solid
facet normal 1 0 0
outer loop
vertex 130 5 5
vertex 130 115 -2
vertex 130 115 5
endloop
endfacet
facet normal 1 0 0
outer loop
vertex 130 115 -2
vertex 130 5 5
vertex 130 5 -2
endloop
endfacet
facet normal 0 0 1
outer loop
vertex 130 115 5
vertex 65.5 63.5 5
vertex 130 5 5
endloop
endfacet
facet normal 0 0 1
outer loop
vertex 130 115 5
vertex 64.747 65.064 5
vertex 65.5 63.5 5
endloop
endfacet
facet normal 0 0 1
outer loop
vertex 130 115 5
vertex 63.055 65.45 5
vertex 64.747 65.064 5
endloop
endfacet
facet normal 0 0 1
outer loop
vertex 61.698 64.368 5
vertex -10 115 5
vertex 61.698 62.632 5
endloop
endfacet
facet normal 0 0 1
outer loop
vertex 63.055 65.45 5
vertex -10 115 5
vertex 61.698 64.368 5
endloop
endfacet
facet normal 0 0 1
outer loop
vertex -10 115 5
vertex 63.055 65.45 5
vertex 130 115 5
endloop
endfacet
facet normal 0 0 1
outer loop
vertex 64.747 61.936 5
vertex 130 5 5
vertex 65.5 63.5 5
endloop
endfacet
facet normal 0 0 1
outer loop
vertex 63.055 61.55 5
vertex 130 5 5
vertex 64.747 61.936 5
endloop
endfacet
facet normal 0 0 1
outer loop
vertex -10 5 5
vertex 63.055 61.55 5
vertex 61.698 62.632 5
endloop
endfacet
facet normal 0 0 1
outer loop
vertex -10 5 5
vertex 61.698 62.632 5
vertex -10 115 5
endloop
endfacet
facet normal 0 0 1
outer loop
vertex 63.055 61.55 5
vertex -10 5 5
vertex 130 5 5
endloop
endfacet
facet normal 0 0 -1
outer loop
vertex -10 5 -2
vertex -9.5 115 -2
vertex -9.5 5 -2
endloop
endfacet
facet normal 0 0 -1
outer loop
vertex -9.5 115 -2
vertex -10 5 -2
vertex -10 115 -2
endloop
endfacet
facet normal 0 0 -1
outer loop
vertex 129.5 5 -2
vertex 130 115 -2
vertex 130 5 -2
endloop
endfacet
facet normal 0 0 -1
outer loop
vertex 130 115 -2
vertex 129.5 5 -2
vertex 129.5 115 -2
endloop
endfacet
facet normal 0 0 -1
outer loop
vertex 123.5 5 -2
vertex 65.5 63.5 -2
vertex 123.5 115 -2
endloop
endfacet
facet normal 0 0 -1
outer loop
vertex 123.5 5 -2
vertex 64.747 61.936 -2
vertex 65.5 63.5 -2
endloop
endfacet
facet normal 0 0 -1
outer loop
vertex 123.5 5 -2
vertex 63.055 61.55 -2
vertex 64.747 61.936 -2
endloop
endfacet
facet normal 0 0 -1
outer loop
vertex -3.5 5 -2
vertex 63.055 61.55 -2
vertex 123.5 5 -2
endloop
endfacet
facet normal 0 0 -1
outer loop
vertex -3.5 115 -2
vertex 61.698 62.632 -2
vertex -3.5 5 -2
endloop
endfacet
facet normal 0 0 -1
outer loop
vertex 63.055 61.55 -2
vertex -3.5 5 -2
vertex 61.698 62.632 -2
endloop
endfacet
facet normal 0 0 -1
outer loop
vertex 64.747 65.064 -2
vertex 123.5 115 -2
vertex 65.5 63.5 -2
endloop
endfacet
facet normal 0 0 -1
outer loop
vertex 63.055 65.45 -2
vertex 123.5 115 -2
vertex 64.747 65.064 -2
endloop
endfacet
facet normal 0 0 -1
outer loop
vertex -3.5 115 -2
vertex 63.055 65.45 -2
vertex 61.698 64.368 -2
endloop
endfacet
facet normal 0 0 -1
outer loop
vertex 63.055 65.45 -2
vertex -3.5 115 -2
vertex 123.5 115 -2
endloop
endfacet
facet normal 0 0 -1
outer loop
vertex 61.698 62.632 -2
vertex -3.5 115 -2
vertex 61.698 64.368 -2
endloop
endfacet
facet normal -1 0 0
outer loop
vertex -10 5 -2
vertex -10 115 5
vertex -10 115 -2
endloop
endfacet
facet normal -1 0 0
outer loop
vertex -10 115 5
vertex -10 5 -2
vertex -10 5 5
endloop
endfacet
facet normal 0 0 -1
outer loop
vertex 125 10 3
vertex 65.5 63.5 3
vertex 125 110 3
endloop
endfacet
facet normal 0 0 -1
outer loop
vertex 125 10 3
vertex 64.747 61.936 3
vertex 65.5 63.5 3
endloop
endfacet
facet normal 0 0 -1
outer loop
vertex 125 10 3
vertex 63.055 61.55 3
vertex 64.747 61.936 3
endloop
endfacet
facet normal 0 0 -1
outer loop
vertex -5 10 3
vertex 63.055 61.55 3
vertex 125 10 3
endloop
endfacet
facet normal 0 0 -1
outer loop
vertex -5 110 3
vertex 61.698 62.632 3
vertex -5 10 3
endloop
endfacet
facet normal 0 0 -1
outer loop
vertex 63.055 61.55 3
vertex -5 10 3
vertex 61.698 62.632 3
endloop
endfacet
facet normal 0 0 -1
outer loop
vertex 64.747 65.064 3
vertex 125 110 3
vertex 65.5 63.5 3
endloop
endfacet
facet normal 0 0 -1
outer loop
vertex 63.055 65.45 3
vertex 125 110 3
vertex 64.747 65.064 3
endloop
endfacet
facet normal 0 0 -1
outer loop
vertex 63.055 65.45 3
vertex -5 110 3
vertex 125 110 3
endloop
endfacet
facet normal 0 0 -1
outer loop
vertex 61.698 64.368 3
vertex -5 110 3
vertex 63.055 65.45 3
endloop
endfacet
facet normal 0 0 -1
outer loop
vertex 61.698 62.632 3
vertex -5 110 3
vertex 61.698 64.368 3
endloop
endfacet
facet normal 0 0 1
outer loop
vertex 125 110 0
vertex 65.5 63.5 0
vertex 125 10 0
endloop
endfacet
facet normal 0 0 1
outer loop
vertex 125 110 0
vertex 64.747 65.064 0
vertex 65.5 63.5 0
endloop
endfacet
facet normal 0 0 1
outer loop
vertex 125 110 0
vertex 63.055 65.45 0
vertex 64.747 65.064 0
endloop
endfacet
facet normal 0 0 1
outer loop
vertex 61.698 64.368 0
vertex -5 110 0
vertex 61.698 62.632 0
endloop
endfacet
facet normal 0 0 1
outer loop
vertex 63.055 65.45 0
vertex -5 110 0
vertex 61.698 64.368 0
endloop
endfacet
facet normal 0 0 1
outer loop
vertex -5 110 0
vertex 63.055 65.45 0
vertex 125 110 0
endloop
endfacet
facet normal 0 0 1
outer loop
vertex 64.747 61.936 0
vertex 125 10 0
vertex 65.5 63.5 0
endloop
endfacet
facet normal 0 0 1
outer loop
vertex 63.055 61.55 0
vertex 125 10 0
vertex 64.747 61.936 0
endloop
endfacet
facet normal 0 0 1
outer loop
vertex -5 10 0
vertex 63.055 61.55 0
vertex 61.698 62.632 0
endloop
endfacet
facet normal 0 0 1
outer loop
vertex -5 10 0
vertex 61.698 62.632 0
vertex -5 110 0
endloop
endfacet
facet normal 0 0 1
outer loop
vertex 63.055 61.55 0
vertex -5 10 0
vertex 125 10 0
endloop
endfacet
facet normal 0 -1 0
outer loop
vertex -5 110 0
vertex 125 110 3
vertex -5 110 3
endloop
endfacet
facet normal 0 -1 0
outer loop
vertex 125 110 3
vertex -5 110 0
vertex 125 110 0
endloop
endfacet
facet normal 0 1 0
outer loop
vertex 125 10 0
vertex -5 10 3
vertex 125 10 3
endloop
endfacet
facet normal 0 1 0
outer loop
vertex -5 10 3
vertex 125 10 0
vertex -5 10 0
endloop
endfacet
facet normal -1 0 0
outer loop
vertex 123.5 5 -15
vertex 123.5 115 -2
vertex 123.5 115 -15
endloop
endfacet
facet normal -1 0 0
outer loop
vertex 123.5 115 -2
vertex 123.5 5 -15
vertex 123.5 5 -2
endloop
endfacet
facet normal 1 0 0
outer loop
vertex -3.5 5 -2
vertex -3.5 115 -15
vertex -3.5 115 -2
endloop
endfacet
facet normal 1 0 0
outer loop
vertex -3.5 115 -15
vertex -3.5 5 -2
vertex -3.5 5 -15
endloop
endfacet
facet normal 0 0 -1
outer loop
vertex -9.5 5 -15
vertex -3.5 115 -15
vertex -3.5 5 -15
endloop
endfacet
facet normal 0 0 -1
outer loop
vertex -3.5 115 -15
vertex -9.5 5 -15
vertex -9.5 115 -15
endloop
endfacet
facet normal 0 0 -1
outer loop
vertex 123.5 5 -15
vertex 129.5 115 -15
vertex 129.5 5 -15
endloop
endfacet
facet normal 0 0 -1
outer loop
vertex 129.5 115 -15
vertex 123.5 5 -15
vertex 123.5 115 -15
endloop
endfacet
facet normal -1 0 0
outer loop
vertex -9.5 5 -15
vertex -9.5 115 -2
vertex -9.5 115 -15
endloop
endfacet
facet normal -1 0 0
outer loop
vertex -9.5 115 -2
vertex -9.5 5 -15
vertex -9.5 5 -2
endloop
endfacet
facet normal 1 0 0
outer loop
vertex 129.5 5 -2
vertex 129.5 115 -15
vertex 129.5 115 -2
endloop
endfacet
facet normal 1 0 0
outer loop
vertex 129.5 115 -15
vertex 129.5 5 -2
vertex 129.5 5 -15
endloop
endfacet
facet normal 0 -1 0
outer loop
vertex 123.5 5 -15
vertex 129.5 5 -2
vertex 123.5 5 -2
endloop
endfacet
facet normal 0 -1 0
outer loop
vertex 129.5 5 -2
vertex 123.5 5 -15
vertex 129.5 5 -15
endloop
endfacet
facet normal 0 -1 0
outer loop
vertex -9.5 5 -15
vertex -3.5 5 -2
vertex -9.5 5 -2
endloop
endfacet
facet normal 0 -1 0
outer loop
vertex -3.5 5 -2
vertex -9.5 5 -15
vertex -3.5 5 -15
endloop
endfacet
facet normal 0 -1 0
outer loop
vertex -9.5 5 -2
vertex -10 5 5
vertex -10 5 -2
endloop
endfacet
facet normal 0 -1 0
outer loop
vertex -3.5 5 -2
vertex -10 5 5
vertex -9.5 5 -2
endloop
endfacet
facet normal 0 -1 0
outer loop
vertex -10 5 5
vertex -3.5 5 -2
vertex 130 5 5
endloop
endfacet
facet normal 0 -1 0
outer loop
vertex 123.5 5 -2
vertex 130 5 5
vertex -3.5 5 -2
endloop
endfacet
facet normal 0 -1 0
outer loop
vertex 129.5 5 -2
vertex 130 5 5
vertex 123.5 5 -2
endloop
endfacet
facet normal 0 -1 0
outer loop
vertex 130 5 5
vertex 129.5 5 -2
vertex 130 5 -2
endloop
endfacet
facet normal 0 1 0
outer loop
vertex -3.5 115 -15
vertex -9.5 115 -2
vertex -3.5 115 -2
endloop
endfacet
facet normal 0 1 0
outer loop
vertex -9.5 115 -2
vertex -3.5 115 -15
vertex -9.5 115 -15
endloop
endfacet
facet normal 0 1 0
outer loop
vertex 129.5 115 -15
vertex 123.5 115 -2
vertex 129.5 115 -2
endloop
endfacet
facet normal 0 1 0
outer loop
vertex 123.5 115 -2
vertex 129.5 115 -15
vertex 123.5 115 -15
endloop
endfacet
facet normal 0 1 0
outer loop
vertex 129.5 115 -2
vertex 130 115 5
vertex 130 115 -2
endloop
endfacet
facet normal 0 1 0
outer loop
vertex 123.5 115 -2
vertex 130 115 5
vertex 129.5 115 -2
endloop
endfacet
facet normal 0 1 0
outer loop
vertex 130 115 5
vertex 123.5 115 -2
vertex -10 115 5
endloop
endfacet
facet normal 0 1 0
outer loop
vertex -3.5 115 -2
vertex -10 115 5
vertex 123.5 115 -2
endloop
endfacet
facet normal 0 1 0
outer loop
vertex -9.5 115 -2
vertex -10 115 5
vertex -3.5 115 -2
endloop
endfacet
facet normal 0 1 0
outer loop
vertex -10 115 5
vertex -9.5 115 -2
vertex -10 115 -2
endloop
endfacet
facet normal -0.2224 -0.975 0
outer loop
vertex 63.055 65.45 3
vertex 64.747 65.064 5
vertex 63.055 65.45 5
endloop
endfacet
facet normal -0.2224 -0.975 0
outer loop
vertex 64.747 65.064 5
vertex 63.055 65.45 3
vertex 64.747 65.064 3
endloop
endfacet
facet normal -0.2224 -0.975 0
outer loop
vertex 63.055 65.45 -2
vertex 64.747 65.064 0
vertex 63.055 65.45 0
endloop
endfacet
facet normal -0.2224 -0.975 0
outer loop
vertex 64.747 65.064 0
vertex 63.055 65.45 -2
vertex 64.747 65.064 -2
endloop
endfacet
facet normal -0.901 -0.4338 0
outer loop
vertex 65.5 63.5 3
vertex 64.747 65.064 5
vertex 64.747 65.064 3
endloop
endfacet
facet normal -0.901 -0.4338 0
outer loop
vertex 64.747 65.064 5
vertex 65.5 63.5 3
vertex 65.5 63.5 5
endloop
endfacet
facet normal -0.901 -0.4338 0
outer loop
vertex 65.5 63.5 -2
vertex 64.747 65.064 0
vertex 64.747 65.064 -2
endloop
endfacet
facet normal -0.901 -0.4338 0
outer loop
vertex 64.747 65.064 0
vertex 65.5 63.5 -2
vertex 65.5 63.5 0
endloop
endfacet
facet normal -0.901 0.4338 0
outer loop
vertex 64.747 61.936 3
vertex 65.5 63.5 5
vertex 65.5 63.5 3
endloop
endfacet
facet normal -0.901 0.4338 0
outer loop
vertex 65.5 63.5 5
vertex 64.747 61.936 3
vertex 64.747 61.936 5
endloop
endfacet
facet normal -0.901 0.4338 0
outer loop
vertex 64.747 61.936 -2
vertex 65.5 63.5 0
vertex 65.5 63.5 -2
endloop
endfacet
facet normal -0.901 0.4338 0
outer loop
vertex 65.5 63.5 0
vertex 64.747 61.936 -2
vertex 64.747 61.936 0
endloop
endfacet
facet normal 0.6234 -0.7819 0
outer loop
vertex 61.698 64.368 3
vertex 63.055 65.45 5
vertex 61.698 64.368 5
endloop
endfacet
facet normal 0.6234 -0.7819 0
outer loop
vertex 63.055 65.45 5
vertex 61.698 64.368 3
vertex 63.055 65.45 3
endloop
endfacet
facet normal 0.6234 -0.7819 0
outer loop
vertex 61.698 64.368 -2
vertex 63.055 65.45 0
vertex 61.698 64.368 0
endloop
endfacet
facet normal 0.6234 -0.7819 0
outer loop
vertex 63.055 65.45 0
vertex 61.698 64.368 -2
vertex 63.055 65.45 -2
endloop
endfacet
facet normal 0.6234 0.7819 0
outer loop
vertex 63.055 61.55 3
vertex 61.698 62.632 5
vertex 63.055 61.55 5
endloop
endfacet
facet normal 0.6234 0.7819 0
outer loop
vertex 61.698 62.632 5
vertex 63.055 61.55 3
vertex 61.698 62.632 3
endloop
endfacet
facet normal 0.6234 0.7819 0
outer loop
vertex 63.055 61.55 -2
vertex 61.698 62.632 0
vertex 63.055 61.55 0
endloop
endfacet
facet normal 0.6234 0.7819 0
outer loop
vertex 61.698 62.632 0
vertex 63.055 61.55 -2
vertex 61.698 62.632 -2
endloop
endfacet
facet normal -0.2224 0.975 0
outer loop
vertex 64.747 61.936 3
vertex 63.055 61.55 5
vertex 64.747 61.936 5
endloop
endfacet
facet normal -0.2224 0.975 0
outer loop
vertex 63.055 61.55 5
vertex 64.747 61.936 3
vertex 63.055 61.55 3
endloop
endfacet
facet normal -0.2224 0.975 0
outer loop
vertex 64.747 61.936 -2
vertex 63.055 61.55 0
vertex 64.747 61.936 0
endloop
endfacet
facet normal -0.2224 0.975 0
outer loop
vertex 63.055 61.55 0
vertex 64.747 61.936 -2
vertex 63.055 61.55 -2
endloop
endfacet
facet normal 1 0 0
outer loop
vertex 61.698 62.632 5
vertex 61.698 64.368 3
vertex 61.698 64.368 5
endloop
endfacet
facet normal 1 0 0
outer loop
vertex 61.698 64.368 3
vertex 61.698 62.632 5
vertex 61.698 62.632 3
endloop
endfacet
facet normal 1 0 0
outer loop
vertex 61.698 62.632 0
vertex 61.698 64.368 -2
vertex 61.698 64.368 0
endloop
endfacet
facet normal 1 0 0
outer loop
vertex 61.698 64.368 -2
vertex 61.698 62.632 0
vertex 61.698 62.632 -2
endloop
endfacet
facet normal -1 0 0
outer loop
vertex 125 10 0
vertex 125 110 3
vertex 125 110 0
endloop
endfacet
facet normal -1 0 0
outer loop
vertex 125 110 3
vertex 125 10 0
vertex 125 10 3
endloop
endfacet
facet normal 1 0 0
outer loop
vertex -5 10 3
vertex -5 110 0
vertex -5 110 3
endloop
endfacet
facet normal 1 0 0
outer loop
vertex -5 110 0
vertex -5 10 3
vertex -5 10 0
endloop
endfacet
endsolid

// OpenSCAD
/*
OPENSCAD Library file by the DoomMeister
Mounting surround for small DC fans (25 - 120mm)

Data taken from various places around the internet.
http://www.qwikflow.com/dc_fans.html

//Released under the terms of the GNU GPL v3.0
This program is free software: you can redistribute it and/or modify
it under the terms of the GNU General Public License as published by
the Free Software Foundation, either version 3 of the License, or
(at your option) any later version.

This program is distributed in the hope that it will be useful,
but WITHOUT ANY WARRANTY; without even the implied warranty of
MERCHANTABILITY or FITNESS FOR A PARTICULAR PURPOSE. See the
GNU General Public License for more details.

You should have received a copy of the GNU General Public License
along with this program. If not, see <http://www.gnu.org/licenses/>.
*/

//uncomment this for example
//fan_mount(size=60,thick=3);

moraw=127;

module fan_mount(size=40,thick = 4){
if(size == 25)
	{
	_fan_mount(
			fan_size = 25,
			fan_mounting_pitch = 20,
			fan_m_hole_dia = 3,
			holder_thickness = thick
		 );
	}
if(size == 30)
	{
	_fan_mount(
			fan_size = 30,
			fan_mounting_pitch = 24,
			fan_m_hole_dia = 3,
			holder_thickness = thick
		 );
	}

if(size == 40)
	{
	_fan_mount(
			fan_size = 40,
			fan_mounting_pitch = 32,
			fan_m_hole_dia = 3.5,
			holder_thickness = thick
		 );
	}
if(size == 45)
	{
	_fan_mount(
			fan_size = 45,
			fan_mounting_pitch = 37,
			fan_m_hole_dia = 4.3,
			holder_thickness = thick
		 );
	}
if(size == 60)
	{
	_fan_mount(
			fan_size = 60,
			fan_mounting_pitch = 50,
			fan_m_hole_dia = 4.4,
			holder_thickness = thick
		 );
	}
if(size == 80)
	{
	_fan_mount(
			fan_size = 80,
			fan_mounting_pitch = 71.5,
			fan_m_hole_dia = 4.4,
			holder_thickness = thick
		 );
	}

if(size == 120)
	{
	_fan_mount(
			fan_size = 120,
			fan_mounting_pitch = 105,
			fan_m_hole_dia = 4.4,
			holder_thickness = thick
		 );
	}
}

//inner module
module _fan_mount(
			fan_size, //nominsl size of fan
			fan_mounting_pitch, //pitch between mounting holes
			fan_m_hole_dia, //mounting hole diameter
			holder_thickness //user defined thickness
		 ){

offset1 = (fan_size-(fan_mounting_pitch + fan_m_hole_dia))/2;
offset2 = (fan_size-(fan_mounting_pitch))/2;
offset3 = offset2 + fan_mounting_pitch;
thickness = (fan_size-fan_mounting_pitch)/2;	
			
			//difference()
			//{
			linear_extrude(height = holder_thickness)
			union()
			{	
			difference()
			{
				translate([fan_m_hole_dia/2,fan_m_hole_dia/2,0])
				minkowski()
				{	
					square([fan_size - fan_m_hole_dia,fan_size - fan_m_hole_dia]);
					circle(r= fan_m_hole_dia/2, $fn=20);
				}
			
					translate([offset1,offset1,0])
					square([fan_mounting_pitch + fan_m_hole_dia,fan_mounting_pitch + fan_m_hole_dia]);
				}
				translate([offset2,offset2,0])
				rotate([0,0,0])_corner_hole();
				translate([offset3,offset2,0])
				rotate([0,0,90])_corner_hole();
				translate([offset2,offset3,0])
				rotate([0,0,90])_corner_hole();
				translate([offset3,offset3,0])
				rotate([0,0,0])_corner_hole();
			}

module _corner_hole()
{
				difference(){
					union(){
							difference(){
							square([fan_m_hole_dia + thickness,fan_m_hole_dia + thickness],center=true);
							square([(fan_m_hole_dia + thickness)/2,(fan_m_hole_dia + thickness)/2],center=false);
							translate([-(fan_m_hole_dia + thickness)/2,-(fan_m_hole_dia + thickness)/2])
							square([(fan_m_hole_dia + thickness)/2,(fan_m_hole_dia + thickness)/2],center=false);
							}
					circle(r=(fan_m_hole_dia + thickness)/2, $fn=20);
					}
					circle(r=(fan_m_hole_dia)/2, $fn=20);
				}
}

}

// we can only print 120mm in the y dimension on a Saturn,
// so cut the ends off, and hollow it out.
difference(){
	wallt = 6;
	// here's the ideal brace; we'll truncate it...
	union(){
		fan_mount(120);
		translate([-excess - wallt / 2, 0, -2]){
			difference(){
				cube([moraw + excess + wallt, 120, 7]);
				translate([10, 10, 2]){
					cube([100, 100, 3]);
				}
			}
		}
		
		excess=moraw - 120;
		
		translate([-excess/2, -excess/2, -2]){
			difference(){
				cube([moraw, moraw, 2]);
				translate([7.5, 7.5, 0]){
					cube([110, 110, 2]);
				}
			}
			translate([-wallt, 0, -13]){
				cube([wallt, moraw, 15]);
			}
			translate([moraw, 0, -13]){
				cube([wallt, moraw, 15]);
			}
		}
	}
	// these ends are cut off grotesquely, and we hollow it out
	// with a drainage port on both sides
	union(){
		// bottom end (why this +1? FIXME)
		translate([-10, -10, -15]){
			cube([moraw + 2 * wallt + 1, 15, 20]);
		}
		// top end (why this +1? FIXME)
		translate([-10, 115, -15]){
			cube([moraw + 2 * wallt + 1, 15, 20]);
		}
		// drainage port
		translate([moraw / 2, moraw / 2, -3]){
			cylinder(10, 2, 2);
		}
		// main hollow
		translate([-5, 10, 0]){
			cube([130, 100, 3]);
		}
	}
}
